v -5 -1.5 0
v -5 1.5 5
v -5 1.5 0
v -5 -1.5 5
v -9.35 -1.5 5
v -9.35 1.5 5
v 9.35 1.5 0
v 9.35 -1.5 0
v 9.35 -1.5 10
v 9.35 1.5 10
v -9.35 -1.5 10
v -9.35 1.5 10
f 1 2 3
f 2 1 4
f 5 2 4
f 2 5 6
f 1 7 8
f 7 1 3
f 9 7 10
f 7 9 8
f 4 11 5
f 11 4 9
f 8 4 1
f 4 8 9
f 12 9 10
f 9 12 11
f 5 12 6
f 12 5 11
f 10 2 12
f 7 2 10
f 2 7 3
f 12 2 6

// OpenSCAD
// Built by bench/smallmodels/features/compiler.py from a list of features.
$fn = 64;
difference() {
  union() {
    translate([0, 0, 0]) linear_extrude(height = 10) polygon([[-9.35, -1.5], [9.35, -1.5], [9.35, 1.5], [-9.35, 1.5]]);
  }
  union() {
    translate([-10, 0, -5]) rotate([0, 0, 0]) translate([-5, -5, 0]) cube([10, 10, 10]);
    translate([20, 0, -5]) rotate([0, 0, 0]) translate([-5, -5, 0]) cube([10, 10, 10]);
  }
}
